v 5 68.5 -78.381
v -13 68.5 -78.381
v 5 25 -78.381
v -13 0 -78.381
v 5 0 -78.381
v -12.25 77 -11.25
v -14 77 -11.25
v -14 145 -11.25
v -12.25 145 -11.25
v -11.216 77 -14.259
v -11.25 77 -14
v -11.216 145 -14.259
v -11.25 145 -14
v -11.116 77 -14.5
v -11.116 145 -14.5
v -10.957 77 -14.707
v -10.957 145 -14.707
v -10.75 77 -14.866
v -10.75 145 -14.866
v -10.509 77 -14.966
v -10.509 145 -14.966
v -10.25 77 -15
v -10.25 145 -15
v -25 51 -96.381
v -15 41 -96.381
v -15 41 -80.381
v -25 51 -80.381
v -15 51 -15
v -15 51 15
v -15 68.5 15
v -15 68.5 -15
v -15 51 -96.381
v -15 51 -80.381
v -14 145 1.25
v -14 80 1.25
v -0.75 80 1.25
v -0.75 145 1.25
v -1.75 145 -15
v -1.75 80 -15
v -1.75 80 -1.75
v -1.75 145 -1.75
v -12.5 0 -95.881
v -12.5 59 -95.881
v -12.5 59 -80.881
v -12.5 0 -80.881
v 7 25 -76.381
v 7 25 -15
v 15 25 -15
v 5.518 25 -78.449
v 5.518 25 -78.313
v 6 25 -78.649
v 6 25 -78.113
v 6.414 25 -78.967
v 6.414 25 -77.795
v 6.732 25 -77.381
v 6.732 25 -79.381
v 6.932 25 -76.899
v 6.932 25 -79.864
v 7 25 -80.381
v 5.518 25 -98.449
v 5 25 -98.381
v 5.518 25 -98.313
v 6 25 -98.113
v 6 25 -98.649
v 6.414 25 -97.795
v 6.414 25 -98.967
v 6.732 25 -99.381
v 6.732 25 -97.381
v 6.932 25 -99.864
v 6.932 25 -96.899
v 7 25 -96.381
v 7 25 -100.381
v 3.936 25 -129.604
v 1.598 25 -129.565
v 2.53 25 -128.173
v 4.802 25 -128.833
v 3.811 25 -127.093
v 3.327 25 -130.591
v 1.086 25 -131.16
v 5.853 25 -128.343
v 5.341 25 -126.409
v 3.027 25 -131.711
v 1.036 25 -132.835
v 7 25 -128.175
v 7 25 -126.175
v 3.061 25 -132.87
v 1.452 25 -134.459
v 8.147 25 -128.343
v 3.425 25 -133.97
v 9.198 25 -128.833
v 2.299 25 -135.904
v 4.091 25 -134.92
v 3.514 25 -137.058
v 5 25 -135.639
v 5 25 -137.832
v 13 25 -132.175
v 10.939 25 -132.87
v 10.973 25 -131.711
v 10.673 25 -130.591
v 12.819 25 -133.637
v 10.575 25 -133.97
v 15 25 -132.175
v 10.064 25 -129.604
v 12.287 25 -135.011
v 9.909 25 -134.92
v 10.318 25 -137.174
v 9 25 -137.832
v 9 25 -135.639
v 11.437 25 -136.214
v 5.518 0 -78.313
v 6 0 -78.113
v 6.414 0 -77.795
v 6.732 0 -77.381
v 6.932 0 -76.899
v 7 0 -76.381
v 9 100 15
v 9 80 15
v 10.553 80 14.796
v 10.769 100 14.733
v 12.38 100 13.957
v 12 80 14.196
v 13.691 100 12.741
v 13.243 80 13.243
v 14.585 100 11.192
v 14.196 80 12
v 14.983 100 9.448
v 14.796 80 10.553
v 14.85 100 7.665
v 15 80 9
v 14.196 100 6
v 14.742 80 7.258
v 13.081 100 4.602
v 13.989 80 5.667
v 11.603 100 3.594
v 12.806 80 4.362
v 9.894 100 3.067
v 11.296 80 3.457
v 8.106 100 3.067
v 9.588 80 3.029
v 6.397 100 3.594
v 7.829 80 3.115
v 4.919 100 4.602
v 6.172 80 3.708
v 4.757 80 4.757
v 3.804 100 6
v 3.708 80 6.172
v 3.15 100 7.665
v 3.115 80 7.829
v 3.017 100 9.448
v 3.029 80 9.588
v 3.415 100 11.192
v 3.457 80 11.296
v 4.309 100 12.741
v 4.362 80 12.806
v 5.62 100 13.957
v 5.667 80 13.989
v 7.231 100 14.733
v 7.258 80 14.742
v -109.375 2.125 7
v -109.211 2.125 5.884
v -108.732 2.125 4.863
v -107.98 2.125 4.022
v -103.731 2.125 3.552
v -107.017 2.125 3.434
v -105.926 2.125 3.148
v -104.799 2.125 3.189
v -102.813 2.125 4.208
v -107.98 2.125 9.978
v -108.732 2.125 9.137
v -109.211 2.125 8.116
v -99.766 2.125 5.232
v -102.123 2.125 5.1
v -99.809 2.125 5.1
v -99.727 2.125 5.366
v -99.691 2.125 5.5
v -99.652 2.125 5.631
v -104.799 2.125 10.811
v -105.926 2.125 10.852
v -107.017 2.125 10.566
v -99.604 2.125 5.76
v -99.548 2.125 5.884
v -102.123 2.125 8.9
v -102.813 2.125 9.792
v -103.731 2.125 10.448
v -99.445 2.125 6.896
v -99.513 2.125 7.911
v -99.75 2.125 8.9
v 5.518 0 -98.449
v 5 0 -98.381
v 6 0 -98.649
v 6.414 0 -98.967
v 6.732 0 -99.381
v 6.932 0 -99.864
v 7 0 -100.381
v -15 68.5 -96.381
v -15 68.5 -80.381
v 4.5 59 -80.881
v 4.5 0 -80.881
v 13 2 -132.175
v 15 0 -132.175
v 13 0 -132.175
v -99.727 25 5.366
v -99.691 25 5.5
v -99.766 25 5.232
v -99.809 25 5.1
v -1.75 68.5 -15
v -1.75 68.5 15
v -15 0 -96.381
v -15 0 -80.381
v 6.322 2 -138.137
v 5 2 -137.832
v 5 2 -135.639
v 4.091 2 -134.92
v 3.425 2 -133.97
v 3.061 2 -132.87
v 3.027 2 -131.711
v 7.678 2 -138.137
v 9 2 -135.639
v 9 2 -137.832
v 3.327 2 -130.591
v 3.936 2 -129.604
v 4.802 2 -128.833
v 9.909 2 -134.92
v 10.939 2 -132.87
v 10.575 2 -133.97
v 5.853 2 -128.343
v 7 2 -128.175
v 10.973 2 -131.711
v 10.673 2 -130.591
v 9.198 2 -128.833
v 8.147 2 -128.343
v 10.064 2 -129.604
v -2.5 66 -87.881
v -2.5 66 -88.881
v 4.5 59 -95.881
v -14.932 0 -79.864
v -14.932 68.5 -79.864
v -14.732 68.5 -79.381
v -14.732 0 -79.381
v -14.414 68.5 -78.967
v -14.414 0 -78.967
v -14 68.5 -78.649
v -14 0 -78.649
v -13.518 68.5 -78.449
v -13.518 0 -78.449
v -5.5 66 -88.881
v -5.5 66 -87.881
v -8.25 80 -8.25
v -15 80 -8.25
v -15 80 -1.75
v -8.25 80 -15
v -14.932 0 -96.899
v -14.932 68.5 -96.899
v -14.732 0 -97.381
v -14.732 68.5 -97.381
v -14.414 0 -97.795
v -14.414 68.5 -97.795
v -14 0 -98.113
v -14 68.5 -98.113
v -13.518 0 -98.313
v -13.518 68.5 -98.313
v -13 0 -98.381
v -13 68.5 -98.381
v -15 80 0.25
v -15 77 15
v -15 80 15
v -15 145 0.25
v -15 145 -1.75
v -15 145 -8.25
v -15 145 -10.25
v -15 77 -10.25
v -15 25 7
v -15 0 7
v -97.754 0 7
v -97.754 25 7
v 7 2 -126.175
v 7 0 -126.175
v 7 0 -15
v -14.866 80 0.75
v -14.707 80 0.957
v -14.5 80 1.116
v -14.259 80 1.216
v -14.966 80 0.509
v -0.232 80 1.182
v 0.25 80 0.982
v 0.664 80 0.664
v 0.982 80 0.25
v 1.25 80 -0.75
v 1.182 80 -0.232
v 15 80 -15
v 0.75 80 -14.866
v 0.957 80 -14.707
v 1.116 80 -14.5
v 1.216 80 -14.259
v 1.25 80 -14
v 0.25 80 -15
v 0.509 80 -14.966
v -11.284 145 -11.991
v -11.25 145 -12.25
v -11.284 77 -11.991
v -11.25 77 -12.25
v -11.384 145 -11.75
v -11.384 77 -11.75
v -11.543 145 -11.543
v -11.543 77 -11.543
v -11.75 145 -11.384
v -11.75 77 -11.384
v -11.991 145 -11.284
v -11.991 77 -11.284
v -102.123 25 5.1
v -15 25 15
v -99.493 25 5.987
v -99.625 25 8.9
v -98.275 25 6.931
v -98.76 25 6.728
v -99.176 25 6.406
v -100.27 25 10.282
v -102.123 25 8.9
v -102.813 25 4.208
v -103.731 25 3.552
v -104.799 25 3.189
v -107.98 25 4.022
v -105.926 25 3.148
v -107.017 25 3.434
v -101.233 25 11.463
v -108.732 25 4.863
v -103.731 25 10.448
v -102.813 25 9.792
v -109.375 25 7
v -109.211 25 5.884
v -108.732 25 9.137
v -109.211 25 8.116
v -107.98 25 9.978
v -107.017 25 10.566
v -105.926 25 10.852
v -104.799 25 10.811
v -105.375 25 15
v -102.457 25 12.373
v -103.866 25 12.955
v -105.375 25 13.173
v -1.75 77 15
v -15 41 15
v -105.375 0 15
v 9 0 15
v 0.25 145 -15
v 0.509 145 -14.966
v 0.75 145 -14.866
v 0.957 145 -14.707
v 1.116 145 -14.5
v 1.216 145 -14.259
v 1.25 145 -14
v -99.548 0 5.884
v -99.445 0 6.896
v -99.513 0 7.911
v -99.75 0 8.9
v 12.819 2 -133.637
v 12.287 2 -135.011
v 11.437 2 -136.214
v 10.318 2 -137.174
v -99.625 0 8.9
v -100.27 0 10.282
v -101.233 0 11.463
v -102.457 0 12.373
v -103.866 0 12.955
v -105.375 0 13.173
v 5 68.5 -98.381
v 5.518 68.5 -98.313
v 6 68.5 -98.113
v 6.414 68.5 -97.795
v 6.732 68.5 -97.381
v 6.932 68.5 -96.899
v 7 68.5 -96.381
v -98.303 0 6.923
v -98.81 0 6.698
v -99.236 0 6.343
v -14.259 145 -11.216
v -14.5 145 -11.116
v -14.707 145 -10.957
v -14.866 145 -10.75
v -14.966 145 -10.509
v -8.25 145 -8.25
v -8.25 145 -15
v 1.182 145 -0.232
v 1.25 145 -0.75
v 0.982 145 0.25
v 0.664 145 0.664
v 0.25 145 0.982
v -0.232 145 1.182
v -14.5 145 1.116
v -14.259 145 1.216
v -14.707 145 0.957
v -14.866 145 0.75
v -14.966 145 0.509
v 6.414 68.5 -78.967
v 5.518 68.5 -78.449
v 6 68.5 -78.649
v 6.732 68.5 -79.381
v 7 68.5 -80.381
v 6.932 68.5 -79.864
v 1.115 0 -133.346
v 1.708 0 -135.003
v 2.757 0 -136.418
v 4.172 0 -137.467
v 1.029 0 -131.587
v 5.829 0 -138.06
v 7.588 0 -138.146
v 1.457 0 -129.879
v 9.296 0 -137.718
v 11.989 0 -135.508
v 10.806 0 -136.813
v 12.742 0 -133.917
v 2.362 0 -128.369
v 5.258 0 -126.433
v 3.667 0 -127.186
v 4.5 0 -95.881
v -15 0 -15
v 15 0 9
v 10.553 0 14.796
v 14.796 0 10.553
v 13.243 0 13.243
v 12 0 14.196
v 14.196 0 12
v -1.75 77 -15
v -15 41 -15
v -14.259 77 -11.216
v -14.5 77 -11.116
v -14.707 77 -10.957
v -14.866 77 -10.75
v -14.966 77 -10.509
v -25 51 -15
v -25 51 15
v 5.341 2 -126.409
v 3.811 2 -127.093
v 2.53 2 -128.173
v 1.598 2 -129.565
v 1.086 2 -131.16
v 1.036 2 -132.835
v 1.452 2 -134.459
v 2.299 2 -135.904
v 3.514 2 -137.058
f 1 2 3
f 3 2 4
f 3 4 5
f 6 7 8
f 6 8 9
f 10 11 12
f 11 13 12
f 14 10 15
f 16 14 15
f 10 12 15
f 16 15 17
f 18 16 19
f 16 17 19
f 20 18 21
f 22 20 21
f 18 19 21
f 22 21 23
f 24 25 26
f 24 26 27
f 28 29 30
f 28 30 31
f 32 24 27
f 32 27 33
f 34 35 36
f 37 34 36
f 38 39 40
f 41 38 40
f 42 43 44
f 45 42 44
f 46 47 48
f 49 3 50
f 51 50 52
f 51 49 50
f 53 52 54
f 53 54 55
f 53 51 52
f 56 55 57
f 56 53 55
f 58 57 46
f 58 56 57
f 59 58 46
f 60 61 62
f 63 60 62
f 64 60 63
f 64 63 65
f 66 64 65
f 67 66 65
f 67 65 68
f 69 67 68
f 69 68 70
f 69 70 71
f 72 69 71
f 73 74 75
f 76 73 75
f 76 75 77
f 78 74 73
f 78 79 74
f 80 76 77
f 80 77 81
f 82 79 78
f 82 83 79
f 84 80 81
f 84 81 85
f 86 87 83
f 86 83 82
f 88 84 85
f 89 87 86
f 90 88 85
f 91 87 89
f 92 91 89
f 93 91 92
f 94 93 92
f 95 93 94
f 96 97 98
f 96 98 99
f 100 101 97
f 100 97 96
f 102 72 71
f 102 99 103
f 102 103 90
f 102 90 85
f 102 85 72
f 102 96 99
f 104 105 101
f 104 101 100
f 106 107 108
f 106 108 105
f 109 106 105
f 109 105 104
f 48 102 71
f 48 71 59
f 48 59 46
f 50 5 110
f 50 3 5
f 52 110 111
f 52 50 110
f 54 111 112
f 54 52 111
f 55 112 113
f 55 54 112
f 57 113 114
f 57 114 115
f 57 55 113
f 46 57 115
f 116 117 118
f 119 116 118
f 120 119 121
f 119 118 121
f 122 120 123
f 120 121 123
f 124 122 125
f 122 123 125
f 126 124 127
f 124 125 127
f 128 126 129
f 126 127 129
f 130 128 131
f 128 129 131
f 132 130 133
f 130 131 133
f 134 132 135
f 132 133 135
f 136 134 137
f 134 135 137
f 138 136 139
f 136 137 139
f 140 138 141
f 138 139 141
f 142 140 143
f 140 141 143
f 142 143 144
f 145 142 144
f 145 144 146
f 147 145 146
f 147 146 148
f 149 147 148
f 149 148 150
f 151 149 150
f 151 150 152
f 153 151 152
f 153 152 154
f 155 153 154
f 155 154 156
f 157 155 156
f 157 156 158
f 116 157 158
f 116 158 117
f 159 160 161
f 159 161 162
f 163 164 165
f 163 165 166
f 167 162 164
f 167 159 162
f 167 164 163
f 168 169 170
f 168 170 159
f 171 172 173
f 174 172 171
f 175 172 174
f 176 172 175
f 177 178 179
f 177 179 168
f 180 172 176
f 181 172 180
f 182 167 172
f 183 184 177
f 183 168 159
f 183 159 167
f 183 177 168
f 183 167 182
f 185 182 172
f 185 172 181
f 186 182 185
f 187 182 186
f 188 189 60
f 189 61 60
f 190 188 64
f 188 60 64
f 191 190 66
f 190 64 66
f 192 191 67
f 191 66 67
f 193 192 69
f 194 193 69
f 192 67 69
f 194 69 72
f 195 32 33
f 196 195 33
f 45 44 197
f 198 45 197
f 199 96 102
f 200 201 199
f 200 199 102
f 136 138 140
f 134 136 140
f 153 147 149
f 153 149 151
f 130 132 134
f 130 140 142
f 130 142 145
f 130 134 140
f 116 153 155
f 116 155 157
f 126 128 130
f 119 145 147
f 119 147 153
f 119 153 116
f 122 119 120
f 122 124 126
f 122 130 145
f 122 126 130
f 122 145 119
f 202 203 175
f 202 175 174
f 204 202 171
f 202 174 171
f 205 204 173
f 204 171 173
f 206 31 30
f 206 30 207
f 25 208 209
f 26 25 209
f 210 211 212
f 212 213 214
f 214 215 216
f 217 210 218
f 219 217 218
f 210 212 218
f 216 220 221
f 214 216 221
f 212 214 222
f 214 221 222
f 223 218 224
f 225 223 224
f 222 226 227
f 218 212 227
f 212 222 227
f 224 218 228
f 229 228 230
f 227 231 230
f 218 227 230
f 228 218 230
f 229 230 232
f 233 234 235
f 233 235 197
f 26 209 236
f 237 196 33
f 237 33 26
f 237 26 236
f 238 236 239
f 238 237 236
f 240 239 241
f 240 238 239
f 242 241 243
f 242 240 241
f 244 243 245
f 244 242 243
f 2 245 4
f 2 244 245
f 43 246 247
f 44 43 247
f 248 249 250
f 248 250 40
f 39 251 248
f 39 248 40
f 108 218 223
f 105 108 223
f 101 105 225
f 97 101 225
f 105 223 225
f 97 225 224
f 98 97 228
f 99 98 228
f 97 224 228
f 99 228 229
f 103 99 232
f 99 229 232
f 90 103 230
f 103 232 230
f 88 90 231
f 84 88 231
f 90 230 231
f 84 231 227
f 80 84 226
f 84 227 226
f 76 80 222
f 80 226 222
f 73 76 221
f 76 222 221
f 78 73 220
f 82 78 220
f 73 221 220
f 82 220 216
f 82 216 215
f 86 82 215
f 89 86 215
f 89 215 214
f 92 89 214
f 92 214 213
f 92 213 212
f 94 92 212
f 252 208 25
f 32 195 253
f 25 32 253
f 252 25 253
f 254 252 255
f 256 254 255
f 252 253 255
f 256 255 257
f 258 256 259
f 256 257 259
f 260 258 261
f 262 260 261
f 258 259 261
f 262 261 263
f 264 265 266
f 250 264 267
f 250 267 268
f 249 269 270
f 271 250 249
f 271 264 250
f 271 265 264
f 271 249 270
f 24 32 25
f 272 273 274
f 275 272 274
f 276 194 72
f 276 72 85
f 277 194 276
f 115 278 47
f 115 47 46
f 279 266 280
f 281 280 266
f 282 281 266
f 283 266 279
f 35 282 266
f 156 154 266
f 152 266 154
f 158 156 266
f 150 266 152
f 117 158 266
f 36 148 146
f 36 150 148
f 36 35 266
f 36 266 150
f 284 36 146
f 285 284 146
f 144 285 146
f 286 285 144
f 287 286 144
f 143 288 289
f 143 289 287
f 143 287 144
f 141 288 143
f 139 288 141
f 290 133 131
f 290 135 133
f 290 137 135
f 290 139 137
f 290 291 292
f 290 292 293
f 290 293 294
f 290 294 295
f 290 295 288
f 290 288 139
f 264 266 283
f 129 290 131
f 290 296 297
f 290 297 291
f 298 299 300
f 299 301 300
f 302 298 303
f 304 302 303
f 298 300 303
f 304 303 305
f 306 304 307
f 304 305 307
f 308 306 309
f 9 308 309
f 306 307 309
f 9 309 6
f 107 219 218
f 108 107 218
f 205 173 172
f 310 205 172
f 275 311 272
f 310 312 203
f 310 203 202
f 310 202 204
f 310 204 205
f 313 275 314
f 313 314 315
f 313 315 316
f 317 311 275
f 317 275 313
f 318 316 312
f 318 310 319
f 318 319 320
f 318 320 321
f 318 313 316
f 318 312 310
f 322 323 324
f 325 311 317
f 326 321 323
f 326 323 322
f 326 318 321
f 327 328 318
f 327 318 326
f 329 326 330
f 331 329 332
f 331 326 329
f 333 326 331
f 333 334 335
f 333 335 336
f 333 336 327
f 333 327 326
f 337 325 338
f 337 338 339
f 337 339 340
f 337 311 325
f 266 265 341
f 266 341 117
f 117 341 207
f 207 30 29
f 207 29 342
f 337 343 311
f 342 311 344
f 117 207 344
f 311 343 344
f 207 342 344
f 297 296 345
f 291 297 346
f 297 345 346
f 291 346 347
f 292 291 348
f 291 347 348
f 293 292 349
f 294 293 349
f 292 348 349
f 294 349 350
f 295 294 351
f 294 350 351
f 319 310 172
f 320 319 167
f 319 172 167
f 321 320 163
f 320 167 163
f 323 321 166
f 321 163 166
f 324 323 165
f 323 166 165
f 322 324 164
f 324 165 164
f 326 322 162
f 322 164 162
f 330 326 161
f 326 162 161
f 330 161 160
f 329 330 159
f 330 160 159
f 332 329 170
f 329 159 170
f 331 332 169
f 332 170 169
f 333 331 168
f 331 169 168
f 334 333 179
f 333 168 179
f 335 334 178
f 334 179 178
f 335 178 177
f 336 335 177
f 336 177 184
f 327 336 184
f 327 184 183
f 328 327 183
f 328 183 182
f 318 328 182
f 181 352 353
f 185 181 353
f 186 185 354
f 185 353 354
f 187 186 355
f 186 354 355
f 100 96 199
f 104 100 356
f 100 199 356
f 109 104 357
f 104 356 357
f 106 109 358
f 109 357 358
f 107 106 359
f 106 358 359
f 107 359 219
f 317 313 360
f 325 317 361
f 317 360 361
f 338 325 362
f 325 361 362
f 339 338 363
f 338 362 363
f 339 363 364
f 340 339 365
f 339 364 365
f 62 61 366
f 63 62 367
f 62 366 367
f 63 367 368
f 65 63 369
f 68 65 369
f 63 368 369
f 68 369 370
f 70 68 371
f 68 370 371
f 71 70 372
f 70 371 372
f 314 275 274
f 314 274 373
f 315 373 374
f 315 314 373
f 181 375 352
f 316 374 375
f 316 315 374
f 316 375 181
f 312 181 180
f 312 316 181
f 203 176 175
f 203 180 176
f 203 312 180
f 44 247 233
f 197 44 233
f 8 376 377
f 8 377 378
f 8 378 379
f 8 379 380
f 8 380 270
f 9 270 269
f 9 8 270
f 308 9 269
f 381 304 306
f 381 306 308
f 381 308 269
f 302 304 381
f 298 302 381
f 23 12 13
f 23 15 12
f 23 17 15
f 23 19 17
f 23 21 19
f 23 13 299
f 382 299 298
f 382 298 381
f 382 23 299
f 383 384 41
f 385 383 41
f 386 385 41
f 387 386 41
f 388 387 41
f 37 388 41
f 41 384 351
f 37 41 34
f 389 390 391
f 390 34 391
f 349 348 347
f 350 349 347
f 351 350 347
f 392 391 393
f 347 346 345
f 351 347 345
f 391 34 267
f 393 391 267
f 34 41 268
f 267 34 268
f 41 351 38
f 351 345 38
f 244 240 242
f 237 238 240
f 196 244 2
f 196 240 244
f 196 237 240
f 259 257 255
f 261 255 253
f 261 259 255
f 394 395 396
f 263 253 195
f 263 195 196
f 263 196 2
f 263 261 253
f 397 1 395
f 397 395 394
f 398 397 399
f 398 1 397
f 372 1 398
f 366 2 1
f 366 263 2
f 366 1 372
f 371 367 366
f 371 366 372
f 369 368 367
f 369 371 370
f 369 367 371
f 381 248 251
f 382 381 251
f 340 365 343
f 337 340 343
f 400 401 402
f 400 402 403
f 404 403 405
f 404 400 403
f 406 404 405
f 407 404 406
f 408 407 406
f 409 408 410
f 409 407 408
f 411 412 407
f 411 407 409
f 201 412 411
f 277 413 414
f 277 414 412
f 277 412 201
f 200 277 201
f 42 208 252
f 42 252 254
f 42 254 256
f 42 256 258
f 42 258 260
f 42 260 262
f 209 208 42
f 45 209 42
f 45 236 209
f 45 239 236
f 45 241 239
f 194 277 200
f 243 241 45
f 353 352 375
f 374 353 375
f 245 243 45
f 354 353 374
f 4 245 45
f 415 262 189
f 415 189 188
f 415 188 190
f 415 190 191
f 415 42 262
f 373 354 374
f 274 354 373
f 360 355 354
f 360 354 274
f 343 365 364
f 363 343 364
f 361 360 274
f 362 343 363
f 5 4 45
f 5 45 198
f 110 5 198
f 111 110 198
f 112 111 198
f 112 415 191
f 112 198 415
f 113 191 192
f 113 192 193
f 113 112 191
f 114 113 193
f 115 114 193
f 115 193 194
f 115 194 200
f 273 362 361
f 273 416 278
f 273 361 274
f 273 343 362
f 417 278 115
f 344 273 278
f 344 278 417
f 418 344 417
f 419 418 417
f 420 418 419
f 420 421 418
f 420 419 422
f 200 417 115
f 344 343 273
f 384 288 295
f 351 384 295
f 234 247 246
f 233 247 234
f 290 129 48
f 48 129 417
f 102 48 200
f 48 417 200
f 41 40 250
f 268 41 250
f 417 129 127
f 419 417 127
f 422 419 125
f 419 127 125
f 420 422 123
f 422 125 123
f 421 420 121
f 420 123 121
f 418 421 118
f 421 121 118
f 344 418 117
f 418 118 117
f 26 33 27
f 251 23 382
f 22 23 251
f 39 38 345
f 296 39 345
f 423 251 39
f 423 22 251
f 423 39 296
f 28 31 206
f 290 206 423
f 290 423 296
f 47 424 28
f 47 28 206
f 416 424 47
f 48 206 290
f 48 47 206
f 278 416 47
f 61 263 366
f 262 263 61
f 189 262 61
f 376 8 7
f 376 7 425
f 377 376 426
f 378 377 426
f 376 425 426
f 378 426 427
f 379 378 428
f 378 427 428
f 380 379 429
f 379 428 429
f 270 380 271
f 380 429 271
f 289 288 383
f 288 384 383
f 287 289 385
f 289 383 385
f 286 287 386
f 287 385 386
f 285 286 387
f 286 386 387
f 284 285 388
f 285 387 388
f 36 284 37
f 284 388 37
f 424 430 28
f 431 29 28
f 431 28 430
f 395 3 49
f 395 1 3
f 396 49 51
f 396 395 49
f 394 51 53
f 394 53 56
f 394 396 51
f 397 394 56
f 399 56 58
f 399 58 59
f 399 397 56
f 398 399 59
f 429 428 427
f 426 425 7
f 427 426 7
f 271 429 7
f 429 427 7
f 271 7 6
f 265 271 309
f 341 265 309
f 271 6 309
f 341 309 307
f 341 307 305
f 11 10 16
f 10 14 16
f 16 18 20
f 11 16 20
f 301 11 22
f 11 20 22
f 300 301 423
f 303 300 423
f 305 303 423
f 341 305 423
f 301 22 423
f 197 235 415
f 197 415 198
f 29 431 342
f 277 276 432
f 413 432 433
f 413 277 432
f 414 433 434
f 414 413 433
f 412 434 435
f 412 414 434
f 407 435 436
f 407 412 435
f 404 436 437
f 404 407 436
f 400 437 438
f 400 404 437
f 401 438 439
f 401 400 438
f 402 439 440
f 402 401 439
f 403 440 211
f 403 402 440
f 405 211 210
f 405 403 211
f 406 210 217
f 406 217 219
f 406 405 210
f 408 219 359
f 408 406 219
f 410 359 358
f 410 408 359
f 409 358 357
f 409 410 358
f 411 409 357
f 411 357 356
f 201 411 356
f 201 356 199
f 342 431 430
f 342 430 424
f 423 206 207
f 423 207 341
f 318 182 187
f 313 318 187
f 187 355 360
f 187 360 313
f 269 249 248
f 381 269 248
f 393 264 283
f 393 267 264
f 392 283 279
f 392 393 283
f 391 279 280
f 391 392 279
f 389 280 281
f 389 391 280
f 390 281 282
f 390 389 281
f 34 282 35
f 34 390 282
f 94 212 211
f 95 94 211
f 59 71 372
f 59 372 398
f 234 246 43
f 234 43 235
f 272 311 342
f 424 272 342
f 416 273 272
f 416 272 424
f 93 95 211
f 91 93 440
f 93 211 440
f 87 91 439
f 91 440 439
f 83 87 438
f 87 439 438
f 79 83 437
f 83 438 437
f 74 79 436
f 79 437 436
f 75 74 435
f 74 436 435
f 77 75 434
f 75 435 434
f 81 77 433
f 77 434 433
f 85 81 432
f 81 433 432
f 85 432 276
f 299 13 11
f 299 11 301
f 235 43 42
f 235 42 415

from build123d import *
from build123d.topology import SkipClean

# Parameters (mm, degrees)
SKETCH1_W                 = 30
SKETCH1_H                 = 30
BOSS_EXTRUDE1_DEPTH       = 80
SKETCH2_R                 = 6
BOSS_EXTRUDE2_DEPTH       = 20
CUT_EXTRUDE1_DEPTH        = 83.764726786
BOSS_EXTRUDE3_DEPTH       = 65
BOSS_EXTRUDE5_DEPTH       = 2
BOSS_EXTRUDE6_DEPTH       = 23
BOSS_EXTRUDE7_DEPTH       = 25
FILLET1_R                 = 2
SKETCH11_R                = 6.055782361
CUT_EXTRUDE2_DEPTH        = 2.125
CUT_EXTRUDE4_DEPTH        = 238.593079129
CUT_EXTRUDE4_DEPTH_BACK   = 238.593079129
SKETCH13_W                = 13.25
SKETCH13_H                = 8.5
FILLET2_R                 = 2
CUT_EXTRUDE6_REACH        = 195.534
SKETCH16_W                = 3.75
SKETCH16_H                = 3.75
FILLET4_R                 = 1
BOSS_EXTRUDE8_REACH       = 230.211
SKETCH17_W                = 22
SKETCH17_H                = 20
SKETCH18_W                = 17
SKETCH18_H                = 15
CUT_EXTRUDE7_DEPTH        = 66
FILLET5_R                 = 2
FILLET6_R                 = 2
CHAMFER1_SIZE             = 7
BOSS_EXTRUDE9_DEPTH       = 30
BOSS_EXTRUDE10_DEPTH      = 8
BOSS_EXTRUDE10_DEPTH_BACK = 8


with BuildPart() as part:
    # Sketch1 → Boss-Extrude1 (new body)
    with BuildSketch(Plane(origin=(0, 0, 0), x_dir=(1, 0, 0), z_dir=(0, 1, 0))):
        Rectangle(SKETCH1_W, SKETCH1_H)
    extrude(amount=BOSS_EXTRUDE1_DEPTH)

    # Sketch2 → Boss-Extrude2 (add)
    with BuildSketch(Plane(origin=(0, 80, 0), x_dir=(1, 0, 0), z_dir=(0, 1, 0))):
        with Locations(Location((9, -9, 0), (0, 0, 270))):
            Circle(SKETCH2_R)
    extrude(amount=BOSS_EXTRUDE2_DEPTH)

    # Sketch3 → Cut-Extrude1 (cut, through all)
    with BuildSketch(Plane(origin=(0, 80, 0), x_dir=(1, 0, 0), z_dir=(0, 1, 0))):
        with BuildLine():
            Line((9, -15), (15, -15))
            Line((15, -15), (15, -9))
            ThreePointArc((15, -9), (13.242640687, -13.242640687), (9, -15))
        make_face()
    extrude(amount=-CUT_EXTRUDE1_DEPTH, mode=Mode.SUBTRACT)

    # Sketch4 → Boss-Extrude3 (add)
    with BuildSketch(Plane(origin=(0, 80, 0), x_dir=(1, 0, 0), z_dir=(0, 1, 0))):
        Polygon((-11.25, 1.75), (-1.75, 1.75), (-1.75, 11.25), (-1.75, 15), (1.25, 15), (1.25, 11.25), (1.25, -1.25), (-11.25, -1.25), (-15, -1.25), (-15, 1.75), align=None)
        Polygon((-11.25, 8.25), (-8.25, 8.25), (-8.25, 11.25), (-8.25, 15), (-11.25, 15), (-11.25, 11.25), (-15, 11.25), (-15, 8.25), align=None)
    extrude(amount=BOSS_EXTRUDE3_DEPTH)

    # Sketch6 → Boss-Extrude5 (add)
    with BuildSketch(Plane.XZ):
        with BuildLine():
            Line((15, -15), (7, -15))
            Line((7, -15), (7, -126.175))
            ThreePointArc((7, -126.175), (2.757359313, -136.417640687), (13, -132.175))
            Line((13, -132.175), (15, -132.175))
            Line((15, -132.175), (15, -15))
        make_face()
    extrude(amount=-BOSS_EXTRUDE5_DEPTH)

    # Sketch7 → Boss-Extrude6 (add)
    with SkipClean():  # the faces are left unmerged after this step: merging them gives an invalid solid
        with BuildSketch(Plane(origin=(0, 2, 0), x_dir=(1, 0, 0), z_dir=(0, 1, 0))):
            with BuildLine():
                Line((9, 137.831854249), (9, 135.639101615))
                ThreePointArc((9, 135.639101615), (7, 128.175), (5, 135.639101615))
                Line((5, 135.639101615), (5, 137.831854249))
                ThreePointArc((5, 137.831854249), (1.086408642, 131.160388128), (7, 126.175))
                Line((7, 126.175), (7, 15))
                Line((7, 15), (15, 15))
                Line((15, 15), (15, 132.175))
                Line((15, 132.175), (13, 132.175))
                ThreePointArc((13, 132.175), (11.898979486, 135.639101615), (9, 137.831854249))
            make_face()
        extrude(amount=BOSS_EXTRUDE6_DEPTH)

    # Sketch9 → Boss-Extrude7 (add)
    with SkipClean():  # the faces are left unmerged after this step: merging them gives an invalid solid
        with BuildSketch(Plane.XZ):
            with BuildLine():
                Line((-15, 15), (-15, 7))
                Line((-15, 7), (-99.5, 7))
                ThreePointArc((-99.5, 7), (-99.577697751, 6.037536458), (-99.80877869, 5.1))
                Line((-99.80877869, 5.1), (-102.122778509, 5.1))
                ThreePointArc((-102.122778509, 5.1), (-109.375, 7), (-102.122778509, 8.9))
                Line((-102.122778509, 8.9), (-99.625, 8.9))
                ThreePointArc((-99.625, 8.9), (-101.816885554, 11.955834237), (-105.375001601, 13.173329766))
                Line((-105.375001601, 13.173329766), (-105.375001601, 15))
                Line((-105.375001601, 15), (-15, 15))
            make_face()
        extrude(amount=-BOSS_EXTRUDE7_DEPTH)

    # Fillet1
    fillet1_edges = [part.edges().sort_by_distance(p)[0] for p in [
        (-99.5, 12.5, 7),
    ]]
    fillet(fillet1_edges, radius=FILLET1_R)

    # Sketch11 → Cut-Extrude2 (cut)
    with SkipClean():  # the faces are left unmerged after this step: merging them gives an invalid solid
        with BuildSketch(Plane.XZ):
            with Locations((-105.5, 7)):
                Circle(SKETCH11_R)
        extrude(amount=-CUT_EXTRUDE2_DEPTH, mode=Mode.SUBTRACT)

    # Sketch13 → Cut-Extrude4 (cut, two sides: drawn at the far end of the back side and taken through both)
    with SkipClean():  # the faces are left unmerged after this step: merging them gives an invalid solid
        with BuildSketch(Plane.XY.offset(15).offset(-CUT_EXTRUDE4_DEPTH_BACK)):
            with Locations((-8.375, 72.75)):
                Rectangle(SKETCH13_W, SKETCH13_H)
        extrude(amount=CUT_EXTRUDE4_DEPTH + CUT_EXTRUDE4_DEPTH_BACK, mode=Mode.SUBTRACT)

    # Fillet2
    fillet2_edges = [part.edges().sort_by_distance(p)[0] for p in [
        (1.25, 112.5, 1.25),
    ]]
    fillet(fillet2_edges, radius=FILLET2_R)

    # Sketch16 → Cut-Extrude6 (cut, up to next)
    with BuildSketch(Plane(origin=(0, 80, 0), x_dir=(1, 0, 0), z_dir=(0, 1, 0)), mode=Mode.PRIVATE) as cut_extrude6_sk1:
        with Locations((-13.125, 13.125)):
            Rectangle(SKETCH16_W, SKETCH16_H)
    cut_extrude6_tool1 = extrude(cut_extrude6_sk1.sketch, amount=-CUT_EXTRUDE6_REACH, mode=Mode.PRIVATE) & part.part
    add(cut_extrude6_tool1.solids().sort_by_distance((-13.125, 80, -13.125))[0], mode=Mode.SUBTRACT)

    # Fillet4
    fillet4_edges = [part.edges().sort_by_distance(p)[0] for p in [
        (-11.25, 112.5, -11.25),
        (-15, 112.5, -11.25),
        (-11.25, 112.5, -15),
        (-15, 112.5, 1.25),
        (1.25, 112.5, -15),
    ]]
    fillet(fillet4_edges, radius=FILLET4_R)

    # Boss-Extrude8: up to this face of the body (flat: up to its plane)
    boss_extrude8_end = Plane(part.part.faces().sort_by_distance((-8.375, 68.5, 0))[0])
    # Sketch17 → Boss-Extrude8 (add, up to the picked face)
    with BuildSketch(Plane.XZ, mode=Mode.PRIVATE) as boss_extrude8_sk1:
        with Locations((-4, -88.38125)):
            Rectangle(SKETCH17_W, SKETCH17_H)
    boss_extrude8_tool1 = split(extrude(boss_extrude8_sk1.sketch, amount=-BOSS_EXTRUDE8_REACH, mode=Mode.PRIVATE), bisect_by=boss_extrude8_end, keep=Keep.BOTH, mode=Mode.PRIVATE)
    add(boss_extrude8_tool1.solids().sort_by(Axis((-4, 0, -88.38125), (0, 1, 0)))[0])

    # Sketch18 → Cut-Extrude7 (cut)
    with SkipClean():  # the faces are left unmerged after this step: merging them gives an invalid solid
        with BuildSketch(Plane.XZ):
            with Locations((-4, -88.38125)):
                Rectangle(SKETCH18_W, SKETCH18_H)
        extrude(amount=-CUT_EXTRUDE7_DEPTH, mode=Mode.SUBTRACT)

    # Fillet5
    fillet5_edges = [part.edges().sort_by_distance(p)[0] for p in [
        (7, 13.5, -78.38125),
        (7, 13.5, -98.38125),
        (-15, 34.25, -98.38125),
        (-15, 34.25, -78.38125),
    ]]
    fillet(fillet5_edges, radius=FILLET5_R)

    # Fillet6
    fillet6_edges = [part.edges().sort_by_distance(p)[0] for p in [
        (7, 46.75, -78.38125),
        (7, 46.75, -98.38125),
    ]]
    fillet(fillet6_edges, radius=FILLET6_R)

    # Chamfer1
    chamfer1_edges = [part.edges().sort_by_distance(p)[0] for p in [
        (-12.5, 66, -88.38125),
        (-4, 66, -80.88125),
        (4.5, 66, -88.38125),
        (-4, 66, -95.88125),
    ]]
    chamfer(chamfer1_edges, length=CHAMFER1_SIZE)

    # Sketch19 → Boss-Extrude9 (add)
    with SkipClean():  # the faces are left unmerged after this step: merging them gives an invalid solid
        with BuildSketch(Plane.XY.offset(15)):
            Polygon((-15, 51), (-25, 51), (-15, 41), align=None)
        extrude(amount=-BOSS_EXTRUDE9_DEPTH)

    # Sketch20 → Boss-Extrude10 (add, two sides: drawn at the far end of the back side and taken through both)
    with SkipClean():  # the faces are left unmerged after this step: merging them gives an invalid solid
        with BuildSketch(Plane(origin=(0, 0, -88.38125), x_dir=(-1, 0, 0), z_dir=(0, 0, -1)).offset(-BOSS_EXTRUDE10_DEPTH_BACK)):
            Polygon((25, 51), (15, 51), (15, 41), align=None)
        extrude(amount=BOSS_EXTRUDE10_DEPTH + BOSS_EXTRUDE10_DEPTH_BACK)


solid = part.part
